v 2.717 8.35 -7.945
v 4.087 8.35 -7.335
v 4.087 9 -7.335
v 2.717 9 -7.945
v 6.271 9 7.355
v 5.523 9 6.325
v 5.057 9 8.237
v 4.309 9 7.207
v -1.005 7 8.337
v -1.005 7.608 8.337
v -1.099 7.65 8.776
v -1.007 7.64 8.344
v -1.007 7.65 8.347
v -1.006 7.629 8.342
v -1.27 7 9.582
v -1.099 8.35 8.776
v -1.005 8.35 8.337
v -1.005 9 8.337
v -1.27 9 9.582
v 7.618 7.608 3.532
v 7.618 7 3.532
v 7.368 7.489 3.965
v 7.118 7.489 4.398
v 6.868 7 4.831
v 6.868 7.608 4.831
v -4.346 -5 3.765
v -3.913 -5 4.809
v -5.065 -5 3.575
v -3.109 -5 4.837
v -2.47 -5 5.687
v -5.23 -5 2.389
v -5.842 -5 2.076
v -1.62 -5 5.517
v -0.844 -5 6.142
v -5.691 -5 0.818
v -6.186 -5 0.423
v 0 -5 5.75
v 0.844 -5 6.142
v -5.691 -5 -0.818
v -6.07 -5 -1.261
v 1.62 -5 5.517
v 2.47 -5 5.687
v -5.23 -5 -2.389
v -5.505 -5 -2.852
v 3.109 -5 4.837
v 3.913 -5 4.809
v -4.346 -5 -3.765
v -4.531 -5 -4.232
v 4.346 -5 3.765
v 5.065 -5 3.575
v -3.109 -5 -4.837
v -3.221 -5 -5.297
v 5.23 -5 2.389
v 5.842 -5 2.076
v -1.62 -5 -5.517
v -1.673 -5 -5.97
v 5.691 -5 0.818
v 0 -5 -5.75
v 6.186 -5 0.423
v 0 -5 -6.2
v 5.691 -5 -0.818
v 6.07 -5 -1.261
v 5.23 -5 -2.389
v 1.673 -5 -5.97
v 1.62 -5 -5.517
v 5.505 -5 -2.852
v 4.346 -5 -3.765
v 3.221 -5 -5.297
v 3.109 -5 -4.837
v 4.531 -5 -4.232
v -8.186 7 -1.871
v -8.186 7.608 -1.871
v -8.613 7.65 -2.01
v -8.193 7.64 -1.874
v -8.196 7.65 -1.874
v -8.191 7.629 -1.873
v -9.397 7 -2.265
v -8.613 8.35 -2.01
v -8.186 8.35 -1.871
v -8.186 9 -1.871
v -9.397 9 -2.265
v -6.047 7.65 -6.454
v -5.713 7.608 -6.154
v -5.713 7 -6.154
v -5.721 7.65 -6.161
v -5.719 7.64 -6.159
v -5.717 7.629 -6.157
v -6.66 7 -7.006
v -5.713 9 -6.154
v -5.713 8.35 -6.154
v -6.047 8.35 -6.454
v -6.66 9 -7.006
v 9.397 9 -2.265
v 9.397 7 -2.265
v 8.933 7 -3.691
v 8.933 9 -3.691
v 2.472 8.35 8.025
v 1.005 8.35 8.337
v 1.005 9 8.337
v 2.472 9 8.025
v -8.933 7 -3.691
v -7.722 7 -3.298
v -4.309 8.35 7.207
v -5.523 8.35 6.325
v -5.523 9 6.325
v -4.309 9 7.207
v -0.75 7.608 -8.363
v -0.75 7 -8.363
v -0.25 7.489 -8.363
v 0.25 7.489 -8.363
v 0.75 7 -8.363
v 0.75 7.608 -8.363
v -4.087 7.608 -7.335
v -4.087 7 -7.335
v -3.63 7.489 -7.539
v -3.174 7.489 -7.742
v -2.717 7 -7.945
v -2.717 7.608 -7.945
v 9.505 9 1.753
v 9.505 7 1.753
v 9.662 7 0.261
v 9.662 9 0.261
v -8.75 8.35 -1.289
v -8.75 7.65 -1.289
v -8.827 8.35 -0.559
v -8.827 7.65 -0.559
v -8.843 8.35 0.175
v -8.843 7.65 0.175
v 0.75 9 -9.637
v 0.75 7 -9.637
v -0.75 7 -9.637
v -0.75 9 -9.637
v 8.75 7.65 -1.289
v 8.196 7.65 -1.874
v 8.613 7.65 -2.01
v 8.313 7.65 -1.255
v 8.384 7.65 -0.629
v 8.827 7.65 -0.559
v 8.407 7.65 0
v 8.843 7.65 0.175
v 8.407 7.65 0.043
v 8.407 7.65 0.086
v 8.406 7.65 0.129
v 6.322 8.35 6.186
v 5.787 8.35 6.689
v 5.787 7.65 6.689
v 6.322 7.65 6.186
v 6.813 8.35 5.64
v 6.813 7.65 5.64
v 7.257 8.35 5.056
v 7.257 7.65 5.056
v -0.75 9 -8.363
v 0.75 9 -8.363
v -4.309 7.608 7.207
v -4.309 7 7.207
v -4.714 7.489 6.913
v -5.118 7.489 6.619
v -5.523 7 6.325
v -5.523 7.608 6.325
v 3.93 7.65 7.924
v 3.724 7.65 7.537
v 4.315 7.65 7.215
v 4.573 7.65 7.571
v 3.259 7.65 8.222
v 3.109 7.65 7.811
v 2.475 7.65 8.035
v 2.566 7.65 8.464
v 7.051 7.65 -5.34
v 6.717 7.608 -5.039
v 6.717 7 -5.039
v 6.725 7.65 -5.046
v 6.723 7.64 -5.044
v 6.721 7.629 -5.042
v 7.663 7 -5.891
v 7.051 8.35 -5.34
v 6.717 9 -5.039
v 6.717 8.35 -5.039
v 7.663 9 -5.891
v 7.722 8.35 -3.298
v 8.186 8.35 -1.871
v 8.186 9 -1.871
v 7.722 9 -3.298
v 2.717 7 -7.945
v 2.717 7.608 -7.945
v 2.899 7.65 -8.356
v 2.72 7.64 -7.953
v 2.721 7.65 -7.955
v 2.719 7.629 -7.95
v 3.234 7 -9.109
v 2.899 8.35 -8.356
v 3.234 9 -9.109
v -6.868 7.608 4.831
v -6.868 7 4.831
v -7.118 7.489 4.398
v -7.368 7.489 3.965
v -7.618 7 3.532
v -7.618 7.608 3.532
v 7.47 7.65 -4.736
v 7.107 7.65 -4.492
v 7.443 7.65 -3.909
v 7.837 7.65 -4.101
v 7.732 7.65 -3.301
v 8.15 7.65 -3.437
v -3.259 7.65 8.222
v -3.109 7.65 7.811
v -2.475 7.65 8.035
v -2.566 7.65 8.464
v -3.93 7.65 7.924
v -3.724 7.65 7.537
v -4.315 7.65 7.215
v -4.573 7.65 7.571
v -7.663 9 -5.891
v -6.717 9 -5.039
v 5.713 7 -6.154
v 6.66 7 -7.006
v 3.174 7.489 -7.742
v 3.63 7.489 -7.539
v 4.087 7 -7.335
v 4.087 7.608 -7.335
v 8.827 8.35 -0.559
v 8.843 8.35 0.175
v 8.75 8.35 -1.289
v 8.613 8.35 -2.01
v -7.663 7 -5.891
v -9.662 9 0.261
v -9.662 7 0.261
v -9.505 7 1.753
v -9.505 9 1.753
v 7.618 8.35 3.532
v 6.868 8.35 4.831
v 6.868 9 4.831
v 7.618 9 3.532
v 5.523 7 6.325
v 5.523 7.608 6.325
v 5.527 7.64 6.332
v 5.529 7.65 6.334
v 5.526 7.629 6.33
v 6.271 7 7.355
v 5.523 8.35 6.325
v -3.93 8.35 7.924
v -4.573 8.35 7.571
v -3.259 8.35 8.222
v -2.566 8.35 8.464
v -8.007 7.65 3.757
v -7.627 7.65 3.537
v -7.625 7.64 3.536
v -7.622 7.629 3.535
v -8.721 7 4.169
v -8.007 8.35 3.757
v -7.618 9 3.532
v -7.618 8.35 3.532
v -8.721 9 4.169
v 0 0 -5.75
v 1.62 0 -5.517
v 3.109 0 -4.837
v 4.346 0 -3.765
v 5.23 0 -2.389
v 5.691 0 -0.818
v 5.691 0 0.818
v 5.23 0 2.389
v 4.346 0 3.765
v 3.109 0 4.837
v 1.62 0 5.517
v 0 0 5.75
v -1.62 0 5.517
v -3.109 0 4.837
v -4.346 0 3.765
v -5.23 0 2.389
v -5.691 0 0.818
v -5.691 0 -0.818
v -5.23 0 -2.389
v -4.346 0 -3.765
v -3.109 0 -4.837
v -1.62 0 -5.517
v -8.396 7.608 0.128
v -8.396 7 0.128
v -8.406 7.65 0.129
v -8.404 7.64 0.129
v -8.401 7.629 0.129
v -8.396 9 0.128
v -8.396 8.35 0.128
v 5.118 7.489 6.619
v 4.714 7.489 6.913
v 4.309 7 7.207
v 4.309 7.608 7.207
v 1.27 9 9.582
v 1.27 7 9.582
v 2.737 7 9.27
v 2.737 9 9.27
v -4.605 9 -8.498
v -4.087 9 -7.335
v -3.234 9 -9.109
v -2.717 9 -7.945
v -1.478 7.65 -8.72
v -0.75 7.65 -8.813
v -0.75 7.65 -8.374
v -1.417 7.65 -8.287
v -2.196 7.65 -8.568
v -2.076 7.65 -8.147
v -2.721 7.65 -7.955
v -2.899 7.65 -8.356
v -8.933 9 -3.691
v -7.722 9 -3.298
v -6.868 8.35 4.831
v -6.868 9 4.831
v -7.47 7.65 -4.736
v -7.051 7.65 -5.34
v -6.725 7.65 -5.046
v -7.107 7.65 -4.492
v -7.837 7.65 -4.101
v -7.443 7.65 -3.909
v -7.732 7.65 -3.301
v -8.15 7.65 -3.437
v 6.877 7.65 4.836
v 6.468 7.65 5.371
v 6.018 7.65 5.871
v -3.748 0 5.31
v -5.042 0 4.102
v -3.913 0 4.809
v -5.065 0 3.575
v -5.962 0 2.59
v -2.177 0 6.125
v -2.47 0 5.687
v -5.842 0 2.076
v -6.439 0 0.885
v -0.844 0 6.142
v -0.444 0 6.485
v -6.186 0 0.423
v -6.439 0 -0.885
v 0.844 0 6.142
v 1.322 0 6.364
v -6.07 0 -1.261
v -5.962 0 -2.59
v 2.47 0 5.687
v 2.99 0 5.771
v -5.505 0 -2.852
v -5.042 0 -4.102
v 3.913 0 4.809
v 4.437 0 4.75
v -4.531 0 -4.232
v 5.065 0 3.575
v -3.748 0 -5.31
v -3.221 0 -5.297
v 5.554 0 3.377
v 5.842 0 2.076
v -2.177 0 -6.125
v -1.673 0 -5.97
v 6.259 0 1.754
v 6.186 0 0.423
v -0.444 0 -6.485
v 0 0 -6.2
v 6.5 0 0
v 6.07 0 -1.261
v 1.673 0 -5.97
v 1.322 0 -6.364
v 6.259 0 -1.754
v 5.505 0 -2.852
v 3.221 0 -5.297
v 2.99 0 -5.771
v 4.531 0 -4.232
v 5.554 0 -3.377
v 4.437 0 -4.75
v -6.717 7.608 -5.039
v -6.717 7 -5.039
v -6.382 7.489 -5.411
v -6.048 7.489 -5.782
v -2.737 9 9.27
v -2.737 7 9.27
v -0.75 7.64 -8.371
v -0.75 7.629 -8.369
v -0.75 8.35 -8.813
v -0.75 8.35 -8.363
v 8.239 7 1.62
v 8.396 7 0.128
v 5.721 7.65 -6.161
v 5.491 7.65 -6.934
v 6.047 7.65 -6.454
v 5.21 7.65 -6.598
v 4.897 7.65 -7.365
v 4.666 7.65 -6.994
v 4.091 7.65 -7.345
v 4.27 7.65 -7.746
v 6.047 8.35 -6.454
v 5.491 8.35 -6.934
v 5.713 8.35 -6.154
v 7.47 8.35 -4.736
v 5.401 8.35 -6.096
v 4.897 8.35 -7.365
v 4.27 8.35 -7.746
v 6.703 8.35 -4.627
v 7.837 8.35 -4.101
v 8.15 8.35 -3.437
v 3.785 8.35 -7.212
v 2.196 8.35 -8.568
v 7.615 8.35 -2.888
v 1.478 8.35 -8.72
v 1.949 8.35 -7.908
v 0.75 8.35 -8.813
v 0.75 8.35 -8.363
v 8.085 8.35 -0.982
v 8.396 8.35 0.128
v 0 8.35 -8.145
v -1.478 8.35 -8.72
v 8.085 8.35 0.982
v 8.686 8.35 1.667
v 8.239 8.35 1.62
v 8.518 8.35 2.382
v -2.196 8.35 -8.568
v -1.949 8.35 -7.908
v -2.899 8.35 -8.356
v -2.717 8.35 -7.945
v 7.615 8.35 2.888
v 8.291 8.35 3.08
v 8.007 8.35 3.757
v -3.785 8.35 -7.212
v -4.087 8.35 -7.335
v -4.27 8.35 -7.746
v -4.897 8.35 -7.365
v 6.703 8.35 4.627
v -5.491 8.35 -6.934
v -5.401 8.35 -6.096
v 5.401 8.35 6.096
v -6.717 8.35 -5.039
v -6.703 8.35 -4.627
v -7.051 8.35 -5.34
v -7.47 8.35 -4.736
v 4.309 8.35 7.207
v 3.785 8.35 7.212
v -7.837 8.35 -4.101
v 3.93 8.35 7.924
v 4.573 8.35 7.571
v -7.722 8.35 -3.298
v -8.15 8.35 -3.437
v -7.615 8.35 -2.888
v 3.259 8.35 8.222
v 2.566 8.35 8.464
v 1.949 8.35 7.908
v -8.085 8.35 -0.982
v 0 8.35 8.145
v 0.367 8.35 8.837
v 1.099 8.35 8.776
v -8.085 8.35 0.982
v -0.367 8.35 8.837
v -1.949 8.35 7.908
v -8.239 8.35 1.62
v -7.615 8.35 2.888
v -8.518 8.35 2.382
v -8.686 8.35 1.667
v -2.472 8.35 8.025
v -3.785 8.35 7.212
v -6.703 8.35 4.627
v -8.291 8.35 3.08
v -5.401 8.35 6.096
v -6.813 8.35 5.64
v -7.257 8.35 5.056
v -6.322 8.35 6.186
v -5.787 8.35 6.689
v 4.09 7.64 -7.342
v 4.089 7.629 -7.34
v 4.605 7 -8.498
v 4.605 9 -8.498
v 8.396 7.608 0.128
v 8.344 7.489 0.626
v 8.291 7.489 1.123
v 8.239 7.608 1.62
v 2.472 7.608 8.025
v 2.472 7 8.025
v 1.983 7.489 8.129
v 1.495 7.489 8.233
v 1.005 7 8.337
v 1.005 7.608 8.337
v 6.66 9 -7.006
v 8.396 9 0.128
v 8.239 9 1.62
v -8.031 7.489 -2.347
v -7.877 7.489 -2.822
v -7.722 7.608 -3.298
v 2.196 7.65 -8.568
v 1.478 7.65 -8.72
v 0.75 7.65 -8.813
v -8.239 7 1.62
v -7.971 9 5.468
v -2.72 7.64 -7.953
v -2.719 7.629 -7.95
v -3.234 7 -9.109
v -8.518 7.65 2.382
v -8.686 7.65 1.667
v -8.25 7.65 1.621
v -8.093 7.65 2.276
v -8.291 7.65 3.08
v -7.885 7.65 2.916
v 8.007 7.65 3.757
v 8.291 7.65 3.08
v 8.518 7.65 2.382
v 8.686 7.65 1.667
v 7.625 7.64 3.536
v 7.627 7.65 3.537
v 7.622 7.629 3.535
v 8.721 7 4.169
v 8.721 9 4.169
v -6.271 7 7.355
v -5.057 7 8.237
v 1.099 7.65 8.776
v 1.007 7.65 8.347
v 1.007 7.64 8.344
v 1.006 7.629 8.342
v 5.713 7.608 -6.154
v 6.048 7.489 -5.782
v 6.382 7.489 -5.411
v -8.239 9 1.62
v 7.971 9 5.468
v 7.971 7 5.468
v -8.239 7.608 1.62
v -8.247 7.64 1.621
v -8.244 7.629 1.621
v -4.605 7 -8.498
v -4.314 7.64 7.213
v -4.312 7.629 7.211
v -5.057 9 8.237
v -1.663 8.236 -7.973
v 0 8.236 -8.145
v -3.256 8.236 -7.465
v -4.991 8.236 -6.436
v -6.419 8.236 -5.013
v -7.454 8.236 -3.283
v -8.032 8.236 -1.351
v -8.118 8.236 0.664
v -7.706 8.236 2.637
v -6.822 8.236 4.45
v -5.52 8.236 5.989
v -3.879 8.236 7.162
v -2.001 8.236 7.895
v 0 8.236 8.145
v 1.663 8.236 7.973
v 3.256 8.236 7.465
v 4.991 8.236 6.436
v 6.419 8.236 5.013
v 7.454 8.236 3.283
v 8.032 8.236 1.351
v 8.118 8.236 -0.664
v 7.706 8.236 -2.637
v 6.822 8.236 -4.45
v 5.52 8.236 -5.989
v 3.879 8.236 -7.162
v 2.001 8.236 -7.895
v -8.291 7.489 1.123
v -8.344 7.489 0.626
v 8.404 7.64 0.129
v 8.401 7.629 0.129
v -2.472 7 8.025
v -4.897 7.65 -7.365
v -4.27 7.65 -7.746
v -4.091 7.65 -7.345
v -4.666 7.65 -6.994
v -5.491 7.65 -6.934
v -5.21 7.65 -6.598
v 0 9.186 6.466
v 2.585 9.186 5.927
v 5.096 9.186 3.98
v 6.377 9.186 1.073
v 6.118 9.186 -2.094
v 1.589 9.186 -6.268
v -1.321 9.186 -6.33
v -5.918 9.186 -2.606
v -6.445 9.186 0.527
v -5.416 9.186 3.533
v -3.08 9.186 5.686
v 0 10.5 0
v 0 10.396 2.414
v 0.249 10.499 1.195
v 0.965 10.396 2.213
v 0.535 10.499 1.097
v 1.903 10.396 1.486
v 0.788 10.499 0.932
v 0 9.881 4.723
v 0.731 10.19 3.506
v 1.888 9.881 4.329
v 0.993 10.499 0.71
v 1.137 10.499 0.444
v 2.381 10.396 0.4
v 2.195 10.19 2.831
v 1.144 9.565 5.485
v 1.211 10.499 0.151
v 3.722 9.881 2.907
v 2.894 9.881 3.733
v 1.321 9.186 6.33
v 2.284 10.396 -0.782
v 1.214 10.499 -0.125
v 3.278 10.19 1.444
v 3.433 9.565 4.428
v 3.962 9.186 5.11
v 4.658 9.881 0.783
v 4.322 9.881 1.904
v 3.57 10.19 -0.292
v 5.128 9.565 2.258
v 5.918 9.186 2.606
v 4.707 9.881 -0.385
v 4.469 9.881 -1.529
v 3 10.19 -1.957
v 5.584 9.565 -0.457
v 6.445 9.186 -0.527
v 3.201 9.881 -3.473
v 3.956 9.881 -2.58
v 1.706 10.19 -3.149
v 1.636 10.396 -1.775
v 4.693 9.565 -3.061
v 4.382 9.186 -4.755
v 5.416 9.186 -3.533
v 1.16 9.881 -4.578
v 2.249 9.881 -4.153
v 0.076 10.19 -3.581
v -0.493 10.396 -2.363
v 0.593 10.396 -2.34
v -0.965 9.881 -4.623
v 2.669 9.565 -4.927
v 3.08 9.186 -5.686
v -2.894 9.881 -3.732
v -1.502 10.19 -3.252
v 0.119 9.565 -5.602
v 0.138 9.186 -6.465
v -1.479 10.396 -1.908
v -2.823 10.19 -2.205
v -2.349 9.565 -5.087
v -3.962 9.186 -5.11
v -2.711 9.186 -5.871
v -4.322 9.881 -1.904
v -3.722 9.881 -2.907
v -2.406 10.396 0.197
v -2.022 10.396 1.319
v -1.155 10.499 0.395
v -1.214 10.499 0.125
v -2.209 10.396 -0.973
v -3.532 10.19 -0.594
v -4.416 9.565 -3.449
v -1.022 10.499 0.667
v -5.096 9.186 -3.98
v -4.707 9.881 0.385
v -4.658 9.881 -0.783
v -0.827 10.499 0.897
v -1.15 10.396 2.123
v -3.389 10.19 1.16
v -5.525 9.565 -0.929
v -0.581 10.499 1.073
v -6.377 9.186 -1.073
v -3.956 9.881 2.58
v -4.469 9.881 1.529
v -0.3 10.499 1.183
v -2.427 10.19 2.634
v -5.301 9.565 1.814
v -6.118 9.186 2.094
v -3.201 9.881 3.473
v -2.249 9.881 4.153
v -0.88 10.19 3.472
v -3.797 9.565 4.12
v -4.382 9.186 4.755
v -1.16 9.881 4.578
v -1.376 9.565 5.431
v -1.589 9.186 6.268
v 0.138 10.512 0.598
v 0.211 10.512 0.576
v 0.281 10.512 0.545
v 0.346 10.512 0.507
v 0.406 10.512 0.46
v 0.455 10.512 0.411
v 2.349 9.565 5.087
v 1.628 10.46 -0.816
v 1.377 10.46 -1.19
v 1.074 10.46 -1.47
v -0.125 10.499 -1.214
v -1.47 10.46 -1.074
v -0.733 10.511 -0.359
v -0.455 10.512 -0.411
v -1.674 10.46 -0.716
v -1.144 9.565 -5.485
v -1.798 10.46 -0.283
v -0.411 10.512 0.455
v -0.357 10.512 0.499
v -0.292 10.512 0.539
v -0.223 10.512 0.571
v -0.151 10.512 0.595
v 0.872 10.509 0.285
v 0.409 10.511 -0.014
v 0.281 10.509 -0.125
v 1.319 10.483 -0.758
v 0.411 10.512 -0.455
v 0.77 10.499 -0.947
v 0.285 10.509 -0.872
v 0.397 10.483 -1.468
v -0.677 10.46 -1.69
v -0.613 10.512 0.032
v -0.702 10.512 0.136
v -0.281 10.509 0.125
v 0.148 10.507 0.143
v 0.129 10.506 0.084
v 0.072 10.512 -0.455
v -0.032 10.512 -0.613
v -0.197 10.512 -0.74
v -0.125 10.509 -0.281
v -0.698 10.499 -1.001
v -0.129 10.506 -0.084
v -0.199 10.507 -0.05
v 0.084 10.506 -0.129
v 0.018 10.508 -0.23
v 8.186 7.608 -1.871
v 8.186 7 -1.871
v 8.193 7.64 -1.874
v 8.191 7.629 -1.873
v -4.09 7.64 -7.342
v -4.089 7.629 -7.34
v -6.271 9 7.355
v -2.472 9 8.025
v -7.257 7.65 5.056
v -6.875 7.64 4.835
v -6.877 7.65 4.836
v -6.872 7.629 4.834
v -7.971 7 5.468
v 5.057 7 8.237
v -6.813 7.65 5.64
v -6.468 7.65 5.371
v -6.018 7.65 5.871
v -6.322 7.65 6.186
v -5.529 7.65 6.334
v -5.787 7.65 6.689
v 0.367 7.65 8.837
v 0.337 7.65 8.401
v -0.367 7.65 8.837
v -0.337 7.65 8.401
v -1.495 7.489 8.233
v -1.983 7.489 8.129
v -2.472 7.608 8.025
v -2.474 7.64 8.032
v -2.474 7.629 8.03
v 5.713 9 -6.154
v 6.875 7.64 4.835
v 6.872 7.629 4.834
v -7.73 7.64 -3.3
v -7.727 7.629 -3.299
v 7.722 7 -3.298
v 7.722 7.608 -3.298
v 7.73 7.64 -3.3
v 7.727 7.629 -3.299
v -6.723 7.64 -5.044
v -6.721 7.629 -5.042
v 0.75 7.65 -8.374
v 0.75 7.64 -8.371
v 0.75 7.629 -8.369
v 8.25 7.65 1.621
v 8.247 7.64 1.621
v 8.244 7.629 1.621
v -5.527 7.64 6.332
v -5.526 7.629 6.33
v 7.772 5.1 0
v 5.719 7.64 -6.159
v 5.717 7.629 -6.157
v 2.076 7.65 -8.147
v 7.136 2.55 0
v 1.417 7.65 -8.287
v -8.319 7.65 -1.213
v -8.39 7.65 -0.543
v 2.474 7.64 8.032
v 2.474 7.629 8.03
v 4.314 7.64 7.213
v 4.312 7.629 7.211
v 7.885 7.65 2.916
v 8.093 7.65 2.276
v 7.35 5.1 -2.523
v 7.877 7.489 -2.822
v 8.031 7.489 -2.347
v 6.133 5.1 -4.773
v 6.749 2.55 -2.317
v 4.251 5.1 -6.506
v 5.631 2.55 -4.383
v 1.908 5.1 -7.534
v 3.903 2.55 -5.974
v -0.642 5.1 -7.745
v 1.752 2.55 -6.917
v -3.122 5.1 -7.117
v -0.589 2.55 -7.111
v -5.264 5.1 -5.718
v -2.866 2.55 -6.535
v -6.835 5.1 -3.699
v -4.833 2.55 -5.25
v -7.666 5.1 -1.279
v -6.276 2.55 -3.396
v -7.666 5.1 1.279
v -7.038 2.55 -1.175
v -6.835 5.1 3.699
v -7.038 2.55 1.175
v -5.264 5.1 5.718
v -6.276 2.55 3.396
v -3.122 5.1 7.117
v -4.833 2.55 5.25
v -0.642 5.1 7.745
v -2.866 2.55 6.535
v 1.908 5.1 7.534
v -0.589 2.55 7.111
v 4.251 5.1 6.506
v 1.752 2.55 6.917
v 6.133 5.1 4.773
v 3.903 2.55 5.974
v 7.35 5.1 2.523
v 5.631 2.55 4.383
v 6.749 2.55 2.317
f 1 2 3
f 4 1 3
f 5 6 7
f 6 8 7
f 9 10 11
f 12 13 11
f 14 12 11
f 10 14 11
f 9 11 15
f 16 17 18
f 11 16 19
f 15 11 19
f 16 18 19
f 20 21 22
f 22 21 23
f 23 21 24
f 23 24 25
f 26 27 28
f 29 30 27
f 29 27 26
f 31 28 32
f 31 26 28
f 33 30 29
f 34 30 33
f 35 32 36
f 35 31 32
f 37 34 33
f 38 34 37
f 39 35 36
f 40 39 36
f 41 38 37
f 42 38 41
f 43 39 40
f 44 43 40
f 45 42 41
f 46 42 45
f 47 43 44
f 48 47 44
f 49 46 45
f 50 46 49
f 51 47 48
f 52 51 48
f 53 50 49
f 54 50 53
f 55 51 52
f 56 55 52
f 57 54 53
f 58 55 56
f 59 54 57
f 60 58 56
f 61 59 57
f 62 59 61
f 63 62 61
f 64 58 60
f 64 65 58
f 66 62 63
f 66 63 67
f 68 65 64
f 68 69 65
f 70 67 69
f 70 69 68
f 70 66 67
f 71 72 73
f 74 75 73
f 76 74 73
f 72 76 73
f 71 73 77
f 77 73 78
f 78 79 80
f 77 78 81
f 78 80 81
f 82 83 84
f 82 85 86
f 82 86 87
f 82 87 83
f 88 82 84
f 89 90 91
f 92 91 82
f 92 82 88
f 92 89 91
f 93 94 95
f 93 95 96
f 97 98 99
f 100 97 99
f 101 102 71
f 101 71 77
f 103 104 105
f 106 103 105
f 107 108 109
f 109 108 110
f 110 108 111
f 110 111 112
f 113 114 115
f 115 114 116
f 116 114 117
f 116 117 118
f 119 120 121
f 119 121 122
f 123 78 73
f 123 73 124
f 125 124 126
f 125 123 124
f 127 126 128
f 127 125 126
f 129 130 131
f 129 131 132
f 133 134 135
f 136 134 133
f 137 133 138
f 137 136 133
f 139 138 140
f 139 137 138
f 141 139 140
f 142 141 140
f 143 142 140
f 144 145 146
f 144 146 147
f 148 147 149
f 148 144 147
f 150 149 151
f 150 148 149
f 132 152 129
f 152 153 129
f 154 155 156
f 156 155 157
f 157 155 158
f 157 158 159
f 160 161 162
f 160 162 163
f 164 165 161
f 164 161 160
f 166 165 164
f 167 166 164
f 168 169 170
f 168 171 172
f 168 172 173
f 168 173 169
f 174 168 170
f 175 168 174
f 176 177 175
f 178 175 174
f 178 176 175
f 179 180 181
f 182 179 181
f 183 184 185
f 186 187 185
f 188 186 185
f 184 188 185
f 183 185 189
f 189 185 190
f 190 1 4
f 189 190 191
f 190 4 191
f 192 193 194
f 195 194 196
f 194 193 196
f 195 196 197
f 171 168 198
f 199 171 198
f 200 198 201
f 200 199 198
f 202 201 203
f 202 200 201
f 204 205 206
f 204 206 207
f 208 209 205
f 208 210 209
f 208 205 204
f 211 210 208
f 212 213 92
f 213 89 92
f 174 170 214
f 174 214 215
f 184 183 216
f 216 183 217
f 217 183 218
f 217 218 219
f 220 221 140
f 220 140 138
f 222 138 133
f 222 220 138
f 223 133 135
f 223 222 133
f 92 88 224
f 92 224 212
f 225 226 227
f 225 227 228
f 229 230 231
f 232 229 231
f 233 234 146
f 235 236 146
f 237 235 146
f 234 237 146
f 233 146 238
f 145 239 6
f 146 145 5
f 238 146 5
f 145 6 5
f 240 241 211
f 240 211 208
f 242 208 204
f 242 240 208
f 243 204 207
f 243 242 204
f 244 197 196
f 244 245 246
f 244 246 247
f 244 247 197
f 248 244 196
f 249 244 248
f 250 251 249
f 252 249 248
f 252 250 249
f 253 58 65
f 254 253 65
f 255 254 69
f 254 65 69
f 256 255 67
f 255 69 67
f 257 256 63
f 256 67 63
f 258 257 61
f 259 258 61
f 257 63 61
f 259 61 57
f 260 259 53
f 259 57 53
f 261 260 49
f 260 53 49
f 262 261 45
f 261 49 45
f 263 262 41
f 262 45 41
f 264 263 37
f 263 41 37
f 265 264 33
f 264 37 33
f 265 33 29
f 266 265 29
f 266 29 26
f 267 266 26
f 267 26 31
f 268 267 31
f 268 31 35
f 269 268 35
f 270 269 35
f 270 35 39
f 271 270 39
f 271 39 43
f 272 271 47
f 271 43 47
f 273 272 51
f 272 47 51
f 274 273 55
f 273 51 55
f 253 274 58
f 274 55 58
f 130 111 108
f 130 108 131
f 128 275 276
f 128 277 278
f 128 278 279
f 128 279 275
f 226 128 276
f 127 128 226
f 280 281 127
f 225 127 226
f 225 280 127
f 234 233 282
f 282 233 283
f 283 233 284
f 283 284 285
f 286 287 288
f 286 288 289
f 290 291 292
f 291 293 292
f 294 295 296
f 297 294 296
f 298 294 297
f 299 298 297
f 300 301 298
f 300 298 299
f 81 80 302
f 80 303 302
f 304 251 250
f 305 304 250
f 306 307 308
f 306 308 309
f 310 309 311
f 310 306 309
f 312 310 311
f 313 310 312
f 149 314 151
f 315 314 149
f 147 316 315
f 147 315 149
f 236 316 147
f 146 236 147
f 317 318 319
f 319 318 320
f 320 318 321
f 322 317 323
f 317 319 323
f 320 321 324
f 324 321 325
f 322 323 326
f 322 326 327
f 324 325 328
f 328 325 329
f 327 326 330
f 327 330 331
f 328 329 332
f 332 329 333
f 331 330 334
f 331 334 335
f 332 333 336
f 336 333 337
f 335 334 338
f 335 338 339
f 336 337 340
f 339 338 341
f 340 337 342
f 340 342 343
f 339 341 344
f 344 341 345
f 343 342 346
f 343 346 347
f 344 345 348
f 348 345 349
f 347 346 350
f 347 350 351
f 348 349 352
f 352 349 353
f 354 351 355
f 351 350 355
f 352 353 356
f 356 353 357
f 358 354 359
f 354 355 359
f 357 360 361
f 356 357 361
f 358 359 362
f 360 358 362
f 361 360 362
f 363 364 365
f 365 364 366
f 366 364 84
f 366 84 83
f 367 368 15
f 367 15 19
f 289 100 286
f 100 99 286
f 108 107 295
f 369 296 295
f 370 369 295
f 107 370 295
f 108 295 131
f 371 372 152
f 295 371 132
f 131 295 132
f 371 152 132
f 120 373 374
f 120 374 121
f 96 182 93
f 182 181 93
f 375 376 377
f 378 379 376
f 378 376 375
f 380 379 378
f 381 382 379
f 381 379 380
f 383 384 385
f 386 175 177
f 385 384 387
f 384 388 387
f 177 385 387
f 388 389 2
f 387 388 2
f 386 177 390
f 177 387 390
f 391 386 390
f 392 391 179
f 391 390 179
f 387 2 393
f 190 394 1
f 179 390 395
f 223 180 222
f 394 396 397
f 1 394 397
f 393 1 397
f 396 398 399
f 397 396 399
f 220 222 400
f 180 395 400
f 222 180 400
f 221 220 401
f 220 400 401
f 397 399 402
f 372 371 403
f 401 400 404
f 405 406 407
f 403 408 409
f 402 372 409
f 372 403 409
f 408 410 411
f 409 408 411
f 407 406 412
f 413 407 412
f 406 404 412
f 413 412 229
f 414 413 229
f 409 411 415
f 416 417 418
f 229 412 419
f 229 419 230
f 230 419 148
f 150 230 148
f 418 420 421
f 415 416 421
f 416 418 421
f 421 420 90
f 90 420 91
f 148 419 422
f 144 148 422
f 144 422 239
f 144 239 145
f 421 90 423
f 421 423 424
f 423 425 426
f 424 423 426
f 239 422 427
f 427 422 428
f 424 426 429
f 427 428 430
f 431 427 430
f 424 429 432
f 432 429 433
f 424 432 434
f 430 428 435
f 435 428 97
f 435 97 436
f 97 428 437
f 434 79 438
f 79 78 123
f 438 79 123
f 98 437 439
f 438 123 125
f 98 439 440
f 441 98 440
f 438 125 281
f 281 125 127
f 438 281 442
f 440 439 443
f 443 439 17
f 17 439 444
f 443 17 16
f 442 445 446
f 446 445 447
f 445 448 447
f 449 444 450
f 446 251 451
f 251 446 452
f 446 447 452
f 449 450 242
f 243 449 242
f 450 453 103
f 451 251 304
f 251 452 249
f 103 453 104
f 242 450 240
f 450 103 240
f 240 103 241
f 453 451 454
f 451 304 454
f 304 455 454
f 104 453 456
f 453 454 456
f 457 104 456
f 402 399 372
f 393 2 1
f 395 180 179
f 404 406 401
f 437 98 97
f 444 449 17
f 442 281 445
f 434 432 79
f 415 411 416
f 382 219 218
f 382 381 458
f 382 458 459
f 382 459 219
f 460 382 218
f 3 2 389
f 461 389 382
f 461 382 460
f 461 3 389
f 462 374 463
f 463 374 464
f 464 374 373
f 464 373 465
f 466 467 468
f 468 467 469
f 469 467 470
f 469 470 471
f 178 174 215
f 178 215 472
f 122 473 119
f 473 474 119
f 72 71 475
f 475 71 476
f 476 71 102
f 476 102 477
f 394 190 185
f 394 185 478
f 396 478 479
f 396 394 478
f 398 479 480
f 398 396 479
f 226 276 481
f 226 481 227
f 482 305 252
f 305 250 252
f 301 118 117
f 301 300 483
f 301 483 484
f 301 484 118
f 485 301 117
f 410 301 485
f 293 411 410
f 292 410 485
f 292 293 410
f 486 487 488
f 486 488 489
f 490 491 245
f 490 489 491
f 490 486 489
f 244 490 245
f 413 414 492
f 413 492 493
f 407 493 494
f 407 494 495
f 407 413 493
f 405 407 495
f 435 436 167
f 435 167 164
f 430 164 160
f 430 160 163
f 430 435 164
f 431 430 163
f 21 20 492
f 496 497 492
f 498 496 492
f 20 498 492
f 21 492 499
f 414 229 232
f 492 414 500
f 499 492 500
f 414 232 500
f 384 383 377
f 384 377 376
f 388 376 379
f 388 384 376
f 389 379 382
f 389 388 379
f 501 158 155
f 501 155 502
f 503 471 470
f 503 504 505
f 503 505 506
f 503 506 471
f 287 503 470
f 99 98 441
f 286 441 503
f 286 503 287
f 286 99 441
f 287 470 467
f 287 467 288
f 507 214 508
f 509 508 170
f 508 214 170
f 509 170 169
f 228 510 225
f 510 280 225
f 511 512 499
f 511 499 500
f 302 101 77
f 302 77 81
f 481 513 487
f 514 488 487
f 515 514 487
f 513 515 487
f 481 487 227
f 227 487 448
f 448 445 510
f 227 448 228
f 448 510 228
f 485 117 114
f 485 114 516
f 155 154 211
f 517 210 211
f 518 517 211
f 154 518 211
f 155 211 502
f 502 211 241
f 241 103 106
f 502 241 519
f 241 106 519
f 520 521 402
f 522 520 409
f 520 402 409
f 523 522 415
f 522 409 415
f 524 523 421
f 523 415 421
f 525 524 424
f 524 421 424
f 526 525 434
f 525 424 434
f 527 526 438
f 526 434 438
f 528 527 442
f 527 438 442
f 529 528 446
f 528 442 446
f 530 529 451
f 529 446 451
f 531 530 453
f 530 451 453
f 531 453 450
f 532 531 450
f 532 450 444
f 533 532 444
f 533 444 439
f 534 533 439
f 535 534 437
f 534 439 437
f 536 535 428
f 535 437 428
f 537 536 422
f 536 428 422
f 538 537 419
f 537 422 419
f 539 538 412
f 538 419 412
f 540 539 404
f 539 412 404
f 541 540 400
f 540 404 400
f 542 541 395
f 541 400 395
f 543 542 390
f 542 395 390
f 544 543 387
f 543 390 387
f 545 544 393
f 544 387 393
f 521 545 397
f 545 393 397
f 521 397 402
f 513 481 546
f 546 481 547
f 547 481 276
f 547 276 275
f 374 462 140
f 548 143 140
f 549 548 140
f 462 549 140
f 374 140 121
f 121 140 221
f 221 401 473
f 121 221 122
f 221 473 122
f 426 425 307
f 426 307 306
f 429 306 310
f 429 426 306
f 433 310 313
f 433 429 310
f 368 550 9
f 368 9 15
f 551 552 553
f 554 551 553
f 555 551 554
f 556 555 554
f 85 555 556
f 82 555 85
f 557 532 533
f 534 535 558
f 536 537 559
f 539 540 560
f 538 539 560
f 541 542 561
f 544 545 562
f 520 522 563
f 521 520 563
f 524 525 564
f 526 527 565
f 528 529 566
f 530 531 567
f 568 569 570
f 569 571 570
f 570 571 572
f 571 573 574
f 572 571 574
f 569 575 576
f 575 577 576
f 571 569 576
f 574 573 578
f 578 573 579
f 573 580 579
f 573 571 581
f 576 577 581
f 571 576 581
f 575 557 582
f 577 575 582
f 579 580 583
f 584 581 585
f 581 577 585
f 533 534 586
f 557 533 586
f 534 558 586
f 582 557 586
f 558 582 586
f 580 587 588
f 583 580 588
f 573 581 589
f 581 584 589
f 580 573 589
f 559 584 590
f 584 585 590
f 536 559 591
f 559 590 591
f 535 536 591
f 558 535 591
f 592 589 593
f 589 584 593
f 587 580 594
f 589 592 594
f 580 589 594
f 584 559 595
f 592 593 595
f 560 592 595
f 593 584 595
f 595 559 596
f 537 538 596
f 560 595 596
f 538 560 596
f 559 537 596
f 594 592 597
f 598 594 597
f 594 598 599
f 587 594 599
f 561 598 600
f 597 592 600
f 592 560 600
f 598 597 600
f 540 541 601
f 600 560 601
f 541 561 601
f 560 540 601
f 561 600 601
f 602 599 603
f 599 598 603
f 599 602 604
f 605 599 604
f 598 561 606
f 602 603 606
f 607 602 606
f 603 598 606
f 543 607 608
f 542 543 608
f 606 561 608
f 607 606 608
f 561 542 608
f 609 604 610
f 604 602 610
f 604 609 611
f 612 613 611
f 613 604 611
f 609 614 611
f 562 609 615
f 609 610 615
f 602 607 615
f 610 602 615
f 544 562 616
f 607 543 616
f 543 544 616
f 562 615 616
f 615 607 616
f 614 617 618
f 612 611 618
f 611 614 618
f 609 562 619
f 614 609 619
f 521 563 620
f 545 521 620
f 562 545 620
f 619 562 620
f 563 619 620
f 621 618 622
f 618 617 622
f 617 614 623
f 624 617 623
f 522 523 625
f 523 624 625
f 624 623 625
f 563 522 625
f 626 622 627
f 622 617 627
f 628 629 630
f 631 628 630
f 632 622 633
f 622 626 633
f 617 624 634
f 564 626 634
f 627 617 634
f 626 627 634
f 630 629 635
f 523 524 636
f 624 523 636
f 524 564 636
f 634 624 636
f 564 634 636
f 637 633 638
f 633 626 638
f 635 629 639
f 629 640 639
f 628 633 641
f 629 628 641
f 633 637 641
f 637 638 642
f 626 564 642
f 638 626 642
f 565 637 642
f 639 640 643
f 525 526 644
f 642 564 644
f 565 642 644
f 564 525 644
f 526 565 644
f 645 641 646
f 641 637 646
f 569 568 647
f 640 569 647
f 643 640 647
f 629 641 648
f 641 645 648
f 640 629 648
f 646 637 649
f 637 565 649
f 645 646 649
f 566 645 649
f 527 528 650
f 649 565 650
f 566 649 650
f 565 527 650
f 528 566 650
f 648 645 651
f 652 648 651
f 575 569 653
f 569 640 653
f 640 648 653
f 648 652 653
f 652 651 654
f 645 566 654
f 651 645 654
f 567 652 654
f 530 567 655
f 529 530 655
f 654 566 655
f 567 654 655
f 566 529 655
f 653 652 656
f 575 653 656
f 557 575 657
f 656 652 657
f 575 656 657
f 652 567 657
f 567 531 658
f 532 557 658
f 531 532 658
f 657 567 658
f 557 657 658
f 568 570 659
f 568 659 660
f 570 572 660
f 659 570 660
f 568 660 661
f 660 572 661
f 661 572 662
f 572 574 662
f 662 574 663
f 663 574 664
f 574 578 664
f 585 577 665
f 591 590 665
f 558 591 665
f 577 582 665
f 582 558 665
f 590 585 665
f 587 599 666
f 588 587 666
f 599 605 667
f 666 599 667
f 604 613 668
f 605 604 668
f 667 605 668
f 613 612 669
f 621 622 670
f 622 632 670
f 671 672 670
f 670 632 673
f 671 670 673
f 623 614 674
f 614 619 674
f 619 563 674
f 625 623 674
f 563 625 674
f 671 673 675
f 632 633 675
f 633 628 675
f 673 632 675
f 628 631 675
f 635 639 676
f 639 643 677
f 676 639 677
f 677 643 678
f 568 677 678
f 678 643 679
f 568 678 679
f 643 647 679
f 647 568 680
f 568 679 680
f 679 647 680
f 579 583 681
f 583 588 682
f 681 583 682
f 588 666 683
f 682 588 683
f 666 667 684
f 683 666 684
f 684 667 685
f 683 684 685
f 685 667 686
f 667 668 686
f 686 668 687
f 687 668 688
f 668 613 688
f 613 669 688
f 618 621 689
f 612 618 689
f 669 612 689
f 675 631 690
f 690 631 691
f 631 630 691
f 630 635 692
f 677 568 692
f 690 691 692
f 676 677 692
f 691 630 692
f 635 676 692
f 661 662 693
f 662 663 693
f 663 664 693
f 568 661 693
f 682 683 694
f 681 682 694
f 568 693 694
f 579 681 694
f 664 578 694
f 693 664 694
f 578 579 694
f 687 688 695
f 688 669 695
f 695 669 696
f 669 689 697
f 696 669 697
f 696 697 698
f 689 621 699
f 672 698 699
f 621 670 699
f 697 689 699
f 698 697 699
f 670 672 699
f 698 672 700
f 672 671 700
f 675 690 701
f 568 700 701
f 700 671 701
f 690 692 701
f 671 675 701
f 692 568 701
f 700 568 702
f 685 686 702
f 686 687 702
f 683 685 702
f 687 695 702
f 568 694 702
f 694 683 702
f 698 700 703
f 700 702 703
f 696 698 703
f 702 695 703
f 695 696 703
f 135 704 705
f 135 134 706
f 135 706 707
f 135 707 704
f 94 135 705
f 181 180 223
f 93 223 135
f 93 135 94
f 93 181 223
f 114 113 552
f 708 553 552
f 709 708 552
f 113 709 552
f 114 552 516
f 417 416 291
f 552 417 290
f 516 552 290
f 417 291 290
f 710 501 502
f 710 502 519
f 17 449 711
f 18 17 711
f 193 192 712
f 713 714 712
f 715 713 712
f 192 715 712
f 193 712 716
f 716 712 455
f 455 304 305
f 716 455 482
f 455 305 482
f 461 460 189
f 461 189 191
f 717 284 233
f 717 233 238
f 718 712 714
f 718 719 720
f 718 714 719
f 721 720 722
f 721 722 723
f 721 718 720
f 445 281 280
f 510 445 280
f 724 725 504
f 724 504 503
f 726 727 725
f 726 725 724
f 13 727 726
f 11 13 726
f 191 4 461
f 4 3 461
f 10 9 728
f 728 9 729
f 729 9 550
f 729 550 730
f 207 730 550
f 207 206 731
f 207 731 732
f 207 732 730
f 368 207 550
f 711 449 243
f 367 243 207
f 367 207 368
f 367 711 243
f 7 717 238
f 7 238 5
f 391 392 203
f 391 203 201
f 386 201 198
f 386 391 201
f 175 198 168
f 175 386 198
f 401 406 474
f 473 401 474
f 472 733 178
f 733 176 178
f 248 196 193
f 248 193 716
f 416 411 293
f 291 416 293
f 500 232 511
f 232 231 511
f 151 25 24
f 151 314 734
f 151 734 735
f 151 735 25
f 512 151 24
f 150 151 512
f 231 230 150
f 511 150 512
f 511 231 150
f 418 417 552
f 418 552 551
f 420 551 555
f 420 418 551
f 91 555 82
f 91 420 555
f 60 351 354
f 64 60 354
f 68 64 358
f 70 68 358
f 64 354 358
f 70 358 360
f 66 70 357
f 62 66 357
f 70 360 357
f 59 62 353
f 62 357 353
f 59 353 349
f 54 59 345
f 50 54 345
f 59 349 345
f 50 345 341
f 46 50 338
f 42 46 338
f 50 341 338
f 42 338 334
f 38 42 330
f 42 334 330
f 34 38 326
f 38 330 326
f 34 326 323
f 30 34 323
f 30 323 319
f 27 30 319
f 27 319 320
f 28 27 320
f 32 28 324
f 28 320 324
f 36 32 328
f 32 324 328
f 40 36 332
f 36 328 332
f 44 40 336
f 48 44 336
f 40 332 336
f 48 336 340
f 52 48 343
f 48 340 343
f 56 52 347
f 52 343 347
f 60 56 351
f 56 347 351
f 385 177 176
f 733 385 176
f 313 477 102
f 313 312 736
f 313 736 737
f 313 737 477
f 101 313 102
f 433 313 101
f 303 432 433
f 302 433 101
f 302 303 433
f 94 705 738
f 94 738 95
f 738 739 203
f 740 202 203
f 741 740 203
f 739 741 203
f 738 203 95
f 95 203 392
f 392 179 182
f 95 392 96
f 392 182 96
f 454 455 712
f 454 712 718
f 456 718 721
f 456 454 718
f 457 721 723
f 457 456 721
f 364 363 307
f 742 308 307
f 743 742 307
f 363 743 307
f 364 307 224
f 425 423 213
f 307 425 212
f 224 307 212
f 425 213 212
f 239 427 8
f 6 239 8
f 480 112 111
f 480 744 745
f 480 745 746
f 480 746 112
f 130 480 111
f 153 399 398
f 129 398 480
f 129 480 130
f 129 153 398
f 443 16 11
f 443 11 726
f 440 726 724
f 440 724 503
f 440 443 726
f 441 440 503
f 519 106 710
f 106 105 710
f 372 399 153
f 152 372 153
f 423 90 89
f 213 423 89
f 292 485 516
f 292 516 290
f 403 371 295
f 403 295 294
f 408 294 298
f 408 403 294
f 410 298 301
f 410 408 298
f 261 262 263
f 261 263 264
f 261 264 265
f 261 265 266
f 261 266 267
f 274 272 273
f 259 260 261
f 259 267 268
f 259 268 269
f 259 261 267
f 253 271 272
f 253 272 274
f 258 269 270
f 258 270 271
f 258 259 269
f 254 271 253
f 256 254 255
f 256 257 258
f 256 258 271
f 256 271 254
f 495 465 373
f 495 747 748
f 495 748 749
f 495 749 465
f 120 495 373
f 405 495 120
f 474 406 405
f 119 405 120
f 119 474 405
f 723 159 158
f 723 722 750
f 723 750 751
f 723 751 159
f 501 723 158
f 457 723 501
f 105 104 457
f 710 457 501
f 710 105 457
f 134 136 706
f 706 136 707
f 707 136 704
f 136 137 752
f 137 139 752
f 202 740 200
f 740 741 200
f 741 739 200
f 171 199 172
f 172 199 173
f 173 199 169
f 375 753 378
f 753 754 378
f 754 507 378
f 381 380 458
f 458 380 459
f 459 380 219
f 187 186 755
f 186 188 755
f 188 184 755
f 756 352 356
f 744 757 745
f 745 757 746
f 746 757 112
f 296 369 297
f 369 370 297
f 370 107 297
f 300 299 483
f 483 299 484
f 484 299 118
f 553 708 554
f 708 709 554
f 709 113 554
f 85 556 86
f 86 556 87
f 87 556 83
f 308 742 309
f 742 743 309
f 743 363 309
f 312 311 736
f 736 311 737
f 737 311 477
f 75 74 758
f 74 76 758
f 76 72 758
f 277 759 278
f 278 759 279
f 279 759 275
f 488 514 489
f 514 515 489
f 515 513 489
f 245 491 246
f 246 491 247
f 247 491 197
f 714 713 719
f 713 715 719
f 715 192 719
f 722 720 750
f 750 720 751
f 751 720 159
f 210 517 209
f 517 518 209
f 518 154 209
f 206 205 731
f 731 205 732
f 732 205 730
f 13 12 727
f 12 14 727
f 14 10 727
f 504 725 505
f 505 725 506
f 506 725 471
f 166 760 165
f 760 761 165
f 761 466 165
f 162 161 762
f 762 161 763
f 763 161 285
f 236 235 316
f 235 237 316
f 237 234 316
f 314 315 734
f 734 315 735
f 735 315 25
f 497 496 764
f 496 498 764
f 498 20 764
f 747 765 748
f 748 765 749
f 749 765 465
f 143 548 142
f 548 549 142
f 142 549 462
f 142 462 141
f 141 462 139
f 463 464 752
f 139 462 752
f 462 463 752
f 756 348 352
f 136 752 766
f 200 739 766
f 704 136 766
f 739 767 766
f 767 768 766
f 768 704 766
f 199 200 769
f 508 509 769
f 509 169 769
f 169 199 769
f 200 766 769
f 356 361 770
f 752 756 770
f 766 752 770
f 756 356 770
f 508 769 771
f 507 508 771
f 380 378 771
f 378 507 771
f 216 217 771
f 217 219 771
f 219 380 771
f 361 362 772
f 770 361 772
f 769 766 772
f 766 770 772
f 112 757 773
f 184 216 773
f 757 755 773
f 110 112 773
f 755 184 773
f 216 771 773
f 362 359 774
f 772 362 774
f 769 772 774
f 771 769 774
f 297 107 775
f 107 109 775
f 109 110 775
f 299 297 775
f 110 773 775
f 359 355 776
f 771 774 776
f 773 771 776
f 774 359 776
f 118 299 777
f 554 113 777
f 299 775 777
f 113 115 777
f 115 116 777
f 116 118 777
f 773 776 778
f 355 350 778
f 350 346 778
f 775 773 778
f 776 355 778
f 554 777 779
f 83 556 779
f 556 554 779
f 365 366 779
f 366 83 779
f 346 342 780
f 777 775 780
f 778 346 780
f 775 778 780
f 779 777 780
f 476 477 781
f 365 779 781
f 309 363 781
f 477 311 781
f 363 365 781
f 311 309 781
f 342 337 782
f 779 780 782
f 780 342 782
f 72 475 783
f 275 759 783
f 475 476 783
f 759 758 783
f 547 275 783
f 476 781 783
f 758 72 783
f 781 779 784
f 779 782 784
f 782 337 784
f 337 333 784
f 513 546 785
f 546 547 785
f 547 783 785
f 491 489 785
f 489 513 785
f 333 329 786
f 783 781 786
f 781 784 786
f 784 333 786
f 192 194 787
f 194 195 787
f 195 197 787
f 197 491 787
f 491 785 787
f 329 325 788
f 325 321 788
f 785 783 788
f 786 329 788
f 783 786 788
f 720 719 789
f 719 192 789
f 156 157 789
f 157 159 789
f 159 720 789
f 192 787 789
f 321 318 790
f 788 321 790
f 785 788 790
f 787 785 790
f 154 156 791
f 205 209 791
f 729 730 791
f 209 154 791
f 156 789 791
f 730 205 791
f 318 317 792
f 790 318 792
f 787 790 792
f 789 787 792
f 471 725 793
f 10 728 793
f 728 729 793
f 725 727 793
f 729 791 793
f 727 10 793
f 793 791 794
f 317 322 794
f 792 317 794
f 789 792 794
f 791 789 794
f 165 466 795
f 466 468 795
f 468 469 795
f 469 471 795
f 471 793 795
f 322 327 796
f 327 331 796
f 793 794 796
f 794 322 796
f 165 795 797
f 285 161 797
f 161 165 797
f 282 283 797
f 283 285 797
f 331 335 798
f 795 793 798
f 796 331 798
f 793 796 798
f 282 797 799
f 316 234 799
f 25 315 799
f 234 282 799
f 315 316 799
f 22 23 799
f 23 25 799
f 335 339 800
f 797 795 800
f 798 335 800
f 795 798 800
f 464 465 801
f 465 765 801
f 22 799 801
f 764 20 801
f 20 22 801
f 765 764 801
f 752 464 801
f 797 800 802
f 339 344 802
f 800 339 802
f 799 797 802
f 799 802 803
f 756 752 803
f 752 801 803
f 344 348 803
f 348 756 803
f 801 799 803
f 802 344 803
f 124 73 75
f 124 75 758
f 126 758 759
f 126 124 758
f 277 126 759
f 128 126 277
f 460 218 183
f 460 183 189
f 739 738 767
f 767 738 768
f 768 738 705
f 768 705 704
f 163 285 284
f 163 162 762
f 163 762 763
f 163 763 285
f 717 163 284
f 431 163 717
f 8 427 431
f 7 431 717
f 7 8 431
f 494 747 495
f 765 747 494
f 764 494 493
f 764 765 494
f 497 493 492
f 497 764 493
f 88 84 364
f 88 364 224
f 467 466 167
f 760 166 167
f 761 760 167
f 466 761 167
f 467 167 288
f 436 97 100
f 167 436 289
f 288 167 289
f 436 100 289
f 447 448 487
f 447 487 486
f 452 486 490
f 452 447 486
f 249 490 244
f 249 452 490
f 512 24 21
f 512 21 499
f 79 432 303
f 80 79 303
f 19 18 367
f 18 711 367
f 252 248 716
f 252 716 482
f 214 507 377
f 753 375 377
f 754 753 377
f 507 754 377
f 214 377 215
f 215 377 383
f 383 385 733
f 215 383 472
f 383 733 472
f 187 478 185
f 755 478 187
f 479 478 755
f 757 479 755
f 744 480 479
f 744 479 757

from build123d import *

# Parameters (mm, degrees)
SKETCH1_R           = 6.5
BOSS_EXTRUDE1_DEPTH = 8
BOSS_EXTRUDE1_DRAFT = -14
SKETCH2_R           = 6.2
BOSS_EXTRUDE2_DEPTH = 5
SKETCH3_R           = 5.75
CUT_EXTRUDE1_DEPTH  = 5
SKETCH5_W           = 0.7
SKETCH5_H           = 0.7
SKETCH6_W           = 1.273218484
SKETCH6_H           = 2
BOSS_EXTRUDE4_DEPTH = 0.75
CIRPATTERN1_COUNT   = 15


with BuildPart() as part:
    # Sketch1 → Boss-Extrude1 (with draft: the straight prism first)
    with BuildSketch(Plane(origin=(0, 0, 0), x_dir=(1, 0, 0), z_dir=(0, 1, 0))):
        Circle(SKETCH1_R)
    extrude(amount=BOSS_EXTRUDE1_DEPTH)
    # Boss-Extrude1: the draft: its side faces are tilted about the plane it starts from
    boss_extrude1_sides = [part.faces().sort_by_distance(p)[0] for p in [
        (-6.5, 4, 0),
    ]]
    draft(boss_extrude1_sides, Plane(origin=(0, 0, 0), x_dir=(1, 0, 0), z_dir=(0, 1, 0)), BOSS_EXTRUDE1_DRAFT)

    # Sketch2 → Boss-Extrude2 (add)
    with BuildSketch(Plane.XZ):
        with Locations(Location((0, 0, 0), (0, 0, 270))):
            Circle(SKETCH2_R)
    extrude(amount=BOSS_EXTRUDE2_DEPTH)

    # Sketch3 → Cut-Extrude1 (cut)
    with BuildSketch(Plane.XZ.offset(5)):
        with Locations(Location((0, 0, 0), (0, 0, 270))):
            Circle(SKETCH3_R)
    extrude(amount=-CUT_EXTRUDE1_DEPTH, mode=Mode.SUBTRACT)

    # Sketch4 → Revolve1 (revolve)
    with BuildSketch(Plane(origin=(0, 0, 0), x_dir=(0, 0, -1), z_dir=(1, 0, 0)), mode=Mode.PRIVATE) as revolve1_sk:
        with BuildLine():
            Line((0, 8), (0, 10.5))
            add(Edge.make_bspline(
                [(0, 10.5), (4.616560174, 10.68965763), (8.494624023, 8)],
                knots=[0, 0, 0, 1, 1, 1], degree=2))
            Line((8.494624023, 8), (0, 8))
        make_face()
    revolve(revolve1_sk.sketch.rotate(Axis((0, 8, 0), (0, 1, 0)), 180), axis=Axis((0, 8, 0), (0, 1, 0)))

    # Sketch5 → Revolve2 (revolve)
    with BuildSketch(Plane(origin=(0, 0, 0), x_dir=(0, 0, -1), z_dir=(1, 0, 0))):
        with Locations((8.494624023, 8)):
            Rectangle(SKETCH5_W, SKETCH5_H)
    revolve(axis=Axis((0, -5.748475936, 0), (0, 1, 0)))

    # Sketch6 → Boss-Extrude4 (add, symmetric)
    with BuildSketch(Plane(origin=(0, 0, 0), x_dir=(0, 0, -1), z_dir=(1, 0, 0))):
        with Locations((9, 8)):
            Rectangle(SKETCH6_W, SKETCH6_H)
    boss_extrude4 = extrude(amount=BOSS_EXTRUDE4_DEPTH, both=True)

    # CirPattern1: Boss-Extrude4 ×15 about axis
    cirpattern1_axis = Axis((0, 0, 0), (0, 1, 0))
    for i in range(1, CIRPATTERN1_COUNT):
        add(boss_extrude4.rotate(cirpattern1_axis, i * 360 / CIRPATTERN1_COUNT))


solid = part.part
